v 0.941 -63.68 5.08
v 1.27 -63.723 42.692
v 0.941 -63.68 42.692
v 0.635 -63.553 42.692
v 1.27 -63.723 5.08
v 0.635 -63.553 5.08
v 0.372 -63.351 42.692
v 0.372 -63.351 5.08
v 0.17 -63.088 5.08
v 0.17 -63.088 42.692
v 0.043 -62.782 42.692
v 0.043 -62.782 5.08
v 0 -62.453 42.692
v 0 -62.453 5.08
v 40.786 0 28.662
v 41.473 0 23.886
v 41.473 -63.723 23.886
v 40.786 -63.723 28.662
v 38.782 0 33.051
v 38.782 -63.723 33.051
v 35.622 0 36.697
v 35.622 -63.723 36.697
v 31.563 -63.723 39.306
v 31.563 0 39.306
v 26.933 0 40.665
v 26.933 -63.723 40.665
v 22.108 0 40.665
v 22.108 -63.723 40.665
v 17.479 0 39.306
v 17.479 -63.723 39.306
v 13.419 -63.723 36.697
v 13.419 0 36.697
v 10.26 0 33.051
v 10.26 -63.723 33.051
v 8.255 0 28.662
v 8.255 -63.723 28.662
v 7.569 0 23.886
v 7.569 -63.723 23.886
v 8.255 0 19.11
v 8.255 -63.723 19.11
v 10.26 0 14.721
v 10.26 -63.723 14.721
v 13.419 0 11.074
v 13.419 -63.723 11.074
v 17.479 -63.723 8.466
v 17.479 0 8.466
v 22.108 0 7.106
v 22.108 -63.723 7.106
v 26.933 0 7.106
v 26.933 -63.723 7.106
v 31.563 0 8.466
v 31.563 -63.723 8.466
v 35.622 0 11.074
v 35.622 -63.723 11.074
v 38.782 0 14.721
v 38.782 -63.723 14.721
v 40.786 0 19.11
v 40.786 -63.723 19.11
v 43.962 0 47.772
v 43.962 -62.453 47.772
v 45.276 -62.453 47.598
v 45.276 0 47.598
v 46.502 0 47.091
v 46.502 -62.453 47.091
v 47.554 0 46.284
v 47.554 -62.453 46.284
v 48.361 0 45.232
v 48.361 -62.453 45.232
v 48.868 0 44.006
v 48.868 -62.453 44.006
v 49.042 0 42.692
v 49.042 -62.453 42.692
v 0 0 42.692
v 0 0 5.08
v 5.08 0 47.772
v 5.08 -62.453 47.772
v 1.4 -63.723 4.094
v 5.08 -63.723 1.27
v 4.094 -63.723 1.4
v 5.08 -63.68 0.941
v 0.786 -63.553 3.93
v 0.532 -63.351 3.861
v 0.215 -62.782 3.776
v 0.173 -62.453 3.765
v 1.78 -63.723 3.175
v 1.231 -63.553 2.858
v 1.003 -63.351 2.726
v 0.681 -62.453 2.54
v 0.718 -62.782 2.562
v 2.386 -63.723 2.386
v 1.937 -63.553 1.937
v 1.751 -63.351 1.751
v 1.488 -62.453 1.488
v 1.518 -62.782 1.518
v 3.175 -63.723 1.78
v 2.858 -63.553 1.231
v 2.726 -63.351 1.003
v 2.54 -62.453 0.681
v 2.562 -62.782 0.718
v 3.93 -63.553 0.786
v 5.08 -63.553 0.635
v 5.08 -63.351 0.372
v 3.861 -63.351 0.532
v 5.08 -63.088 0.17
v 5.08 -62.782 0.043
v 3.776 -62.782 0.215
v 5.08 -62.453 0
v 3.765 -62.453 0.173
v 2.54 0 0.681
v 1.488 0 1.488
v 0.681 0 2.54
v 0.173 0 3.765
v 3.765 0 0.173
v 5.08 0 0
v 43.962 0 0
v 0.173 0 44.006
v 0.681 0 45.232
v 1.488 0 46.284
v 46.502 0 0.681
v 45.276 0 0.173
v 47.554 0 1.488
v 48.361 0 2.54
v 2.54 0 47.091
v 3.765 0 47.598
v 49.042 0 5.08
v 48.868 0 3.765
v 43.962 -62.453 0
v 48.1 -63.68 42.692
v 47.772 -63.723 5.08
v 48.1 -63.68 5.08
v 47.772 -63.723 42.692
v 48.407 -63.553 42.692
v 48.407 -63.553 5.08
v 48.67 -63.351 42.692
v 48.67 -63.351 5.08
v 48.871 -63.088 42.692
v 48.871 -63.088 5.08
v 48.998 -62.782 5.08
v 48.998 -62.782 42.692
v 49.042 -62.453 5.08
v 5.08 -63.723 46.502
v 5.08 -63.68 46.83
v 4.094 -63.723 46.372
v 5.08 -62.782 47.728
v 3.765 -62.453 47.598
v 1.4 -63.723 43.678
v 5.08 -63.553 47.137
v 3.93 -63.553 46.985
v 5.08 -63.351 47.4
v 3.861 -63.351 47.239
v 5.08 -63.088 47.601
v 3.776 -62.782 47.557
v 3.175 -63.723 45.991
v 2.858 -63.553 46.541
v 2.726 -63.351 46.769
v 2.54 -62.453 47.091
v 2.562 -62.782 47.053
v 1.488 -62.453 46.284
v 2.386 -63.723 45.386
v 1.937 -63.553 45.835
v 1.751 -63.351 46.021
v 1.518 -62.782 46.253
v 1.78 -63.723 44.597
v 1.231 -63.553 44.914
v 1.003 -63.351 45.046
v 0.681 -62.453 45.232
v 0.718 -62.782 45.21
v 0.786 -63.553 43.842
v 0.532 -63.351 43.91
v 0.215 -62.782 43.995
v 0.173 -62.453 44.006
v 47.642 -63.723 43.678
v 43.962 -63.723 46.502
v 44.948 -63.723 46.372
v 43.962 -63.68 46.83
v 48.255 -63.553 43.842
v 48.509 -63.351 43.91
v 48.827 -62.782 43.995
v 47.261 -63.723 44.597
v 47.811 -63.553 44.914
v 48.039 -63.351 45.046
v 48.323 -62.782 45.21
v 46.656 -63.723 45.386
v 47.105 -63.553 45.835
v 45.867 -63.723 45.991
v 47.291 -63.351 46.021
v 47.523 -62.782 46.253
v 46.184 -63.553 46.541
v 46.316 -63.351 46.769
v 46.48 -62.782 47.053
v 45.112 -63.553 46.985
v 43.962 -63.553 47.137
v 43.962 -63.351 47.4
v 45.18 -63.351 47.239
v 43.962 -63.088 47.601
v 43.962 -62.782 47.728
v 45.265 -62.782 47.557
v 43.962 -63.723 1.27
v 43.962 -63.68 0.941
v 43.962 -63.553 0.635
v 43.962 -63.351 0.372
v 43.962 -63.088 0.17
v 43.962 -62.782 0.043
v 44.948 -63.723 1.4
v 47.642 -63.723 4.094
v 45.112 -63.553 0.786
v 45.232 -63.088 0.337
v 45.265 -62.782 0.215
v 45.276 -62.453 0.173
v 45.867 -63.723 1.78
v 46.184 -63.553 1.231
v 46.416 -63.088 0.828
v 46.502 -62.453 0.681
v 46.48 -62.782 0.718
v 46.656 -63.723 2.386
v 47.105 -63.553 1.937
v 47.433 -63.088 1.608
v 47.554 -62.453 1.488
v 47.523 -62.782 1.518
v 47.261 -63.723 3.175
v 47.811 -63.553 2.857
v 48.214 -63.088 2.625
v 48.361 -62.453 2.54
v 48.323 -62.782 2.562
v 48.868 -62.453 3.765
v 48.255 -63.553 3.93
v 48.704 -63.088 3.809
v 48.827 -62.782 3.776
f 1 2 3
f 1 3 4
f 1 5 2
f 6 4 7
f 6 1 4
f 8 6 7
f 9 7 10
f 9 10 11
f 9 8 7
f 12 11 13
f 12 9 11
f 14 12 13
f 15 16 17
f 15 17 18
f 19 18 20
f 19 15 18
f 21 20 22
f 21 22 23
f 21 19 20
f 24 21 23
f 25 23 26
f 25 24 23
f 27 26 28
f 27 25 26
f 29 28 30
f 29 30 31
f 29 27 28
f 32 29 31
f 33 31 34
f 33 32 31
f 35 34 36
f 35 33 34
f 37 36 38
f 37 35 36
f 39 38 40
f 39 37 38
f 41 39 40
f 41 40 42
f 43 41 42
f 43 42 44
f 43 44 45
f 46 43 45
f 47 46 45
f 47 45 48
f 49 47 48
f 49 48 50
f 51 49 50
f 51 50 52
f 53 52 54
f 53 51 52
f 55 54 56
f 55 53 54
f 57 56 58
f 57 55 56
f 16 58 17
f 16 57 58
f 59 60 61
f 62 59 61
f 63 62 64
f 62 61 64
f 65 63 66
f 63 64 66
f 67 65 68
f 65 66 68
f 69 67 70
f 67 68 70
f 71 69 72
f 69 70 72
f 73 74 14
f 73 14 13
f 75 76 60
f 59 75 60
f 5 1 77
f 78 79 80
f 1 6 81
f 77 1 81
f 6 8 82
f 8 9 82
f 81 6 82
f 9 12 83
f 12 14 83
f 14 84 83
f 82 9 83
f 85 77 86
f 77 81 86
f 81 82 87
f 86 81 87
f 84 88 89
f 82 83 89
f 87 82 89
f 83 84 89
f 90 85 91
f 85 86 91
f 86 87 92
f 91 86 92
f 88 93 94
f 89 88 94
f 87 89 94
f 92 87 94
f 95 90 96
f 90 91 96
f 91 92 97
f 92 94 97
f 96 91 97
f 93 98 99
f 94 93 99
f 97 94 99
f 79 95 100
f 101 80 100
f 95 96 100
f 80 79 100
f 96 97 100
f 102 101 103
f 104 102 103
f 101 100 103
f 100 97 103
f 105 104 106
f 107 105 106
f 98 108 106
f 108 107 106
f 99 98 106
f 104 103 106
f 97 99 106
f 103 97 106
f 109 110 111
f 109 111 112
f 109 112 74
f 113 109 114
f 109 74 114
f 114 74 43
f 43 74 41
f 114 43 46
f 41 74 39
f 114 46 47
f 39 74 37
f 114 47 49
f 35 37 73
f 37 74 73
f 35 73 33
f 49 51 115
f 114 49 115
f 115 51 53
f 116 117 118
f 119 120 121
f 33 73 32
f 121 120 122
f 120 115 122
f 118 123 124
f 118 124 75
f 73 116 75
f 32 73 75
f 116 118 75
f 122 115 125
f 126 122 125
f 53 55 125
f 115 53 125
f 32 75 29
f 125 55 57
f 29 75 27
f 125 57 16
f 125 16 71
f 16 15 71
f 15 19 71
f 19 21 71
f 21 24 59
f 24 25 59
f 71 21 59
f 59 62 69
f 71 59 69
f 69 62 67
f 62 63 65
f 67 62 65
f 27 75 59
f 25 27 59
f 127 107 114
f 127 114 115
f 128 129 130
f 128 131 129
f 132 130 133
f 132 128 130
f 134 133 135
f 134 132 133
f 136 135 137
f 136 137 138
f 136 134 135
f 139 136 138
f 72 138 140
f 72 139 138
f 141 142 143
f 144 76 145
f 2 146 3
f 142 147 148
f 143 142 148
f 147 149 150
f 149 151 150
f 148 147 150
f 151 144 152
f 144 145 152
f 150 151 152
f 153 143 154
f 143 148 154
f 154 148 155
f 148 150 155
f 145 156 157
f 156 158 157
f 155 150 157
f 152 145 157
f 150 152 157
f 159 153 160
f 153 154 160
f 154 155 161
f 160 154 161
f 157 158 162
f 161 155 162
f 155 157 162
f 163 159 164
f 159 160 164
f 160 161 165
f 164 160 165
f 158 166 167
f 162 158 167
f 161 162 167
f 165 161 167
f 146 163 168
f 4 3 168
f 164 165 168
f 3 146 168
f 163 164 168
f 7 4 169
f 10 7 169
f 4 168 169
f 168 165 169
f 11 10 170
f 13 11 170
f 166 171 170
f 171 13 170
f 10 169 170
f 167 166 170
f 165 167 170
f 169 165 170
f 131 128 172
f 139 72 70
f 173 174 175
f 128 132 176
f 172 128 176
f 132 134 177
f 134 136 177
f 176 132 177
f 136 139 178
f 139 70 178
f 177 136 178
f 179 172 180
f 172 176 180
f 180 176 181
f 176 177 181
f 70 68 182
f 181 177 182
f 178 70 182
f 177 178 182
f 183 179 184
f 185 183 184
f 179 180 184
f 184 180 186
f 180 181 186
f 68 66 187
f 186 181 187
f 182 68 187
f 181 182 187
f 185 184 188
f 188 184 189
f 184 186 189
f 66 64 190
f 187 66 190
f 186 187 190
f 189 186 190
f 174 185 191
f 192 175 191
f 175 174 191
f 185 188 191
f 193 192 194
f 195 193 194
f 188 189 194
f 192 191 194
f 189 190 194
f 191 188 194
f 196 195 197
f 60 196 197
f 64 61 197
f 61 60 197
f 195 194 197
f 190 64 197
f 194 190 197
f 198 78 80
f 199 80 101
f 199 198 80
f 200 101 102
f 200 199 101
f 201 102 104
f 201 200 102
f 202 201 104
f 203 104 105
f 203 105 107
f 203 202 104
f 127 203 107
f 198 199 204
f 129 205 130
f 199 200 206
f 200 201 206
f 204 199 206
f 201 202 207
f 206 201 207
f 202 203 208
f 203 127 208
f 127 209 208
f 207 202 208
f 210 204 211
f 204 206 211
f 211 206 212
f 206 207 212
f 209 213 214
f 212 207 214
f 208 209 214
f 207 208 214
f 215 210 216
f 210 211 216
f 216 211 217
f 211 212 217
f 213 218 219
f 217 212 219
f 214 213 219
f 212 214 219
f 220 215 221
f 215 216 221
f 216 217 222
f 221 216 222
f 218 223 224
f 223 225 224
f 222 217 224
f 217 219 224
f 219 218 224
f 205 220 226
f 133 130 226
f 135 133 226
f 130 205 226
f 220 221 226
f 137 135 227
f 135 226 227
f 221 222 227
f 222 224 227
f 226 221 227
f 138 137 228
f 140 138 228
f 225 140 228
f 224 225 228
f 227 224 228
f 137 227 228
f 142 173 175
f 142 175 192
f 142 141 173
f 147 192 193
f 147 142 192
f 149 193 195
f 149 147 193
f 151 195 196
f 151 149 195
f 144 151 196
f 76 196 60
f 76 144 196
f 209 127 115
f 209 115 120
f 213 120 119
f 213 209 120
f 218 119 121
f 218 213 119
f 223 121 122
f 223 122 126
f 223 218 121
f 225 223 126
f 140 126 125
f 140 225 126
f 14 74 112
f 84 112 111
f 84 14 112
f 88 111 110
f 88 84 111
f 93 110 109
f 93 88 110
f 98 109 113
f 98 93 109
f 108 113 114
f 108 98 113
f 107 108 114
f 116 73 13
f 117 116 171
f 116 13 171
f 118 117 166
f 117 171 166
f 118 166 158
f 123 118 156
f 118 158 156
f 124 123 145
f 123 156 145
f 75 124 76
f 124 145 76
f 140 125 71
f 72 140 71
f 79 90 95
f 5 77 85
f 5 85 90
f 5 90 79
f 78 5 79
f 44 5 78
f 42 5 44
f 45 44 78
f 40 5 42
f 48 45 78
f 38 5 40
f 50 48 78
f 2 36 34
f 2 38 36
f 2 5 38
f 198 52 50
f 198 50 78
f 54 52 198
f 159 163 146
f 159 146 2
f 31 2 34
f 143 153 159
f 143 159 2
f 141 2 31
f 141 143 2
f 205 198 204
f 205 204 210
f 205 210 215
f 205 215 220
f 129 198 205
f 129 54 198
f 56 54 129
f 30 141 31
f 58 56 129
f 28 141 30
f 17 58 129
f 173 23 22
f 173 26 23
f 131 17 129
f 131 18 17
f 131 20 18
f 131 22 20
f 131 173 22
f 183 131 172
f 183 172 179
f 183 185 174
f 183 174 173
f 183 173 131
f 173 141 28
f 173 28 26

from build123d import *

# Parameters (mm, degrees)
F0_W     = 49.041539
F0_H     = 47.77154
F0_R     = 16.952149
F1_DEPTH = 63.72292
F2_R     = 5.08
F3_R     = 1.27


with BuildPart() as f1:
    # F0 (on Front) → F1 (new body)
    with BuildSketch(Plane.XZ):
        with Locations((24.52077, 23.88577)):
            Rectangle(F0_W, F0_H)
        with Locations((24.52077, 23.88577)):
            Circle(F0_R, mode=Mode.SUBTRACT)
    extrude(amount=F1_DEPTH)

    # F2
    f2_edges = [f1.edges().sort_by_distance(p)[0] for p in [
        (49.041539, -31.86146, 47.77154),
        (0, -31.86146, 47.77154),
        (49.041539, -31.86146, 0),
        (0, -31.86146, 0),
    ]]
    fillet(f2_edges, radius=F2_R)

    # F3
    f3_edges = [f1.edges().sort_by_distance(p)[0] for p in [
        (49.041539, -63.72292, 23.88577),
    ]]
    fillet(f3_edges, radius=F3_R)


solid = f1.part
